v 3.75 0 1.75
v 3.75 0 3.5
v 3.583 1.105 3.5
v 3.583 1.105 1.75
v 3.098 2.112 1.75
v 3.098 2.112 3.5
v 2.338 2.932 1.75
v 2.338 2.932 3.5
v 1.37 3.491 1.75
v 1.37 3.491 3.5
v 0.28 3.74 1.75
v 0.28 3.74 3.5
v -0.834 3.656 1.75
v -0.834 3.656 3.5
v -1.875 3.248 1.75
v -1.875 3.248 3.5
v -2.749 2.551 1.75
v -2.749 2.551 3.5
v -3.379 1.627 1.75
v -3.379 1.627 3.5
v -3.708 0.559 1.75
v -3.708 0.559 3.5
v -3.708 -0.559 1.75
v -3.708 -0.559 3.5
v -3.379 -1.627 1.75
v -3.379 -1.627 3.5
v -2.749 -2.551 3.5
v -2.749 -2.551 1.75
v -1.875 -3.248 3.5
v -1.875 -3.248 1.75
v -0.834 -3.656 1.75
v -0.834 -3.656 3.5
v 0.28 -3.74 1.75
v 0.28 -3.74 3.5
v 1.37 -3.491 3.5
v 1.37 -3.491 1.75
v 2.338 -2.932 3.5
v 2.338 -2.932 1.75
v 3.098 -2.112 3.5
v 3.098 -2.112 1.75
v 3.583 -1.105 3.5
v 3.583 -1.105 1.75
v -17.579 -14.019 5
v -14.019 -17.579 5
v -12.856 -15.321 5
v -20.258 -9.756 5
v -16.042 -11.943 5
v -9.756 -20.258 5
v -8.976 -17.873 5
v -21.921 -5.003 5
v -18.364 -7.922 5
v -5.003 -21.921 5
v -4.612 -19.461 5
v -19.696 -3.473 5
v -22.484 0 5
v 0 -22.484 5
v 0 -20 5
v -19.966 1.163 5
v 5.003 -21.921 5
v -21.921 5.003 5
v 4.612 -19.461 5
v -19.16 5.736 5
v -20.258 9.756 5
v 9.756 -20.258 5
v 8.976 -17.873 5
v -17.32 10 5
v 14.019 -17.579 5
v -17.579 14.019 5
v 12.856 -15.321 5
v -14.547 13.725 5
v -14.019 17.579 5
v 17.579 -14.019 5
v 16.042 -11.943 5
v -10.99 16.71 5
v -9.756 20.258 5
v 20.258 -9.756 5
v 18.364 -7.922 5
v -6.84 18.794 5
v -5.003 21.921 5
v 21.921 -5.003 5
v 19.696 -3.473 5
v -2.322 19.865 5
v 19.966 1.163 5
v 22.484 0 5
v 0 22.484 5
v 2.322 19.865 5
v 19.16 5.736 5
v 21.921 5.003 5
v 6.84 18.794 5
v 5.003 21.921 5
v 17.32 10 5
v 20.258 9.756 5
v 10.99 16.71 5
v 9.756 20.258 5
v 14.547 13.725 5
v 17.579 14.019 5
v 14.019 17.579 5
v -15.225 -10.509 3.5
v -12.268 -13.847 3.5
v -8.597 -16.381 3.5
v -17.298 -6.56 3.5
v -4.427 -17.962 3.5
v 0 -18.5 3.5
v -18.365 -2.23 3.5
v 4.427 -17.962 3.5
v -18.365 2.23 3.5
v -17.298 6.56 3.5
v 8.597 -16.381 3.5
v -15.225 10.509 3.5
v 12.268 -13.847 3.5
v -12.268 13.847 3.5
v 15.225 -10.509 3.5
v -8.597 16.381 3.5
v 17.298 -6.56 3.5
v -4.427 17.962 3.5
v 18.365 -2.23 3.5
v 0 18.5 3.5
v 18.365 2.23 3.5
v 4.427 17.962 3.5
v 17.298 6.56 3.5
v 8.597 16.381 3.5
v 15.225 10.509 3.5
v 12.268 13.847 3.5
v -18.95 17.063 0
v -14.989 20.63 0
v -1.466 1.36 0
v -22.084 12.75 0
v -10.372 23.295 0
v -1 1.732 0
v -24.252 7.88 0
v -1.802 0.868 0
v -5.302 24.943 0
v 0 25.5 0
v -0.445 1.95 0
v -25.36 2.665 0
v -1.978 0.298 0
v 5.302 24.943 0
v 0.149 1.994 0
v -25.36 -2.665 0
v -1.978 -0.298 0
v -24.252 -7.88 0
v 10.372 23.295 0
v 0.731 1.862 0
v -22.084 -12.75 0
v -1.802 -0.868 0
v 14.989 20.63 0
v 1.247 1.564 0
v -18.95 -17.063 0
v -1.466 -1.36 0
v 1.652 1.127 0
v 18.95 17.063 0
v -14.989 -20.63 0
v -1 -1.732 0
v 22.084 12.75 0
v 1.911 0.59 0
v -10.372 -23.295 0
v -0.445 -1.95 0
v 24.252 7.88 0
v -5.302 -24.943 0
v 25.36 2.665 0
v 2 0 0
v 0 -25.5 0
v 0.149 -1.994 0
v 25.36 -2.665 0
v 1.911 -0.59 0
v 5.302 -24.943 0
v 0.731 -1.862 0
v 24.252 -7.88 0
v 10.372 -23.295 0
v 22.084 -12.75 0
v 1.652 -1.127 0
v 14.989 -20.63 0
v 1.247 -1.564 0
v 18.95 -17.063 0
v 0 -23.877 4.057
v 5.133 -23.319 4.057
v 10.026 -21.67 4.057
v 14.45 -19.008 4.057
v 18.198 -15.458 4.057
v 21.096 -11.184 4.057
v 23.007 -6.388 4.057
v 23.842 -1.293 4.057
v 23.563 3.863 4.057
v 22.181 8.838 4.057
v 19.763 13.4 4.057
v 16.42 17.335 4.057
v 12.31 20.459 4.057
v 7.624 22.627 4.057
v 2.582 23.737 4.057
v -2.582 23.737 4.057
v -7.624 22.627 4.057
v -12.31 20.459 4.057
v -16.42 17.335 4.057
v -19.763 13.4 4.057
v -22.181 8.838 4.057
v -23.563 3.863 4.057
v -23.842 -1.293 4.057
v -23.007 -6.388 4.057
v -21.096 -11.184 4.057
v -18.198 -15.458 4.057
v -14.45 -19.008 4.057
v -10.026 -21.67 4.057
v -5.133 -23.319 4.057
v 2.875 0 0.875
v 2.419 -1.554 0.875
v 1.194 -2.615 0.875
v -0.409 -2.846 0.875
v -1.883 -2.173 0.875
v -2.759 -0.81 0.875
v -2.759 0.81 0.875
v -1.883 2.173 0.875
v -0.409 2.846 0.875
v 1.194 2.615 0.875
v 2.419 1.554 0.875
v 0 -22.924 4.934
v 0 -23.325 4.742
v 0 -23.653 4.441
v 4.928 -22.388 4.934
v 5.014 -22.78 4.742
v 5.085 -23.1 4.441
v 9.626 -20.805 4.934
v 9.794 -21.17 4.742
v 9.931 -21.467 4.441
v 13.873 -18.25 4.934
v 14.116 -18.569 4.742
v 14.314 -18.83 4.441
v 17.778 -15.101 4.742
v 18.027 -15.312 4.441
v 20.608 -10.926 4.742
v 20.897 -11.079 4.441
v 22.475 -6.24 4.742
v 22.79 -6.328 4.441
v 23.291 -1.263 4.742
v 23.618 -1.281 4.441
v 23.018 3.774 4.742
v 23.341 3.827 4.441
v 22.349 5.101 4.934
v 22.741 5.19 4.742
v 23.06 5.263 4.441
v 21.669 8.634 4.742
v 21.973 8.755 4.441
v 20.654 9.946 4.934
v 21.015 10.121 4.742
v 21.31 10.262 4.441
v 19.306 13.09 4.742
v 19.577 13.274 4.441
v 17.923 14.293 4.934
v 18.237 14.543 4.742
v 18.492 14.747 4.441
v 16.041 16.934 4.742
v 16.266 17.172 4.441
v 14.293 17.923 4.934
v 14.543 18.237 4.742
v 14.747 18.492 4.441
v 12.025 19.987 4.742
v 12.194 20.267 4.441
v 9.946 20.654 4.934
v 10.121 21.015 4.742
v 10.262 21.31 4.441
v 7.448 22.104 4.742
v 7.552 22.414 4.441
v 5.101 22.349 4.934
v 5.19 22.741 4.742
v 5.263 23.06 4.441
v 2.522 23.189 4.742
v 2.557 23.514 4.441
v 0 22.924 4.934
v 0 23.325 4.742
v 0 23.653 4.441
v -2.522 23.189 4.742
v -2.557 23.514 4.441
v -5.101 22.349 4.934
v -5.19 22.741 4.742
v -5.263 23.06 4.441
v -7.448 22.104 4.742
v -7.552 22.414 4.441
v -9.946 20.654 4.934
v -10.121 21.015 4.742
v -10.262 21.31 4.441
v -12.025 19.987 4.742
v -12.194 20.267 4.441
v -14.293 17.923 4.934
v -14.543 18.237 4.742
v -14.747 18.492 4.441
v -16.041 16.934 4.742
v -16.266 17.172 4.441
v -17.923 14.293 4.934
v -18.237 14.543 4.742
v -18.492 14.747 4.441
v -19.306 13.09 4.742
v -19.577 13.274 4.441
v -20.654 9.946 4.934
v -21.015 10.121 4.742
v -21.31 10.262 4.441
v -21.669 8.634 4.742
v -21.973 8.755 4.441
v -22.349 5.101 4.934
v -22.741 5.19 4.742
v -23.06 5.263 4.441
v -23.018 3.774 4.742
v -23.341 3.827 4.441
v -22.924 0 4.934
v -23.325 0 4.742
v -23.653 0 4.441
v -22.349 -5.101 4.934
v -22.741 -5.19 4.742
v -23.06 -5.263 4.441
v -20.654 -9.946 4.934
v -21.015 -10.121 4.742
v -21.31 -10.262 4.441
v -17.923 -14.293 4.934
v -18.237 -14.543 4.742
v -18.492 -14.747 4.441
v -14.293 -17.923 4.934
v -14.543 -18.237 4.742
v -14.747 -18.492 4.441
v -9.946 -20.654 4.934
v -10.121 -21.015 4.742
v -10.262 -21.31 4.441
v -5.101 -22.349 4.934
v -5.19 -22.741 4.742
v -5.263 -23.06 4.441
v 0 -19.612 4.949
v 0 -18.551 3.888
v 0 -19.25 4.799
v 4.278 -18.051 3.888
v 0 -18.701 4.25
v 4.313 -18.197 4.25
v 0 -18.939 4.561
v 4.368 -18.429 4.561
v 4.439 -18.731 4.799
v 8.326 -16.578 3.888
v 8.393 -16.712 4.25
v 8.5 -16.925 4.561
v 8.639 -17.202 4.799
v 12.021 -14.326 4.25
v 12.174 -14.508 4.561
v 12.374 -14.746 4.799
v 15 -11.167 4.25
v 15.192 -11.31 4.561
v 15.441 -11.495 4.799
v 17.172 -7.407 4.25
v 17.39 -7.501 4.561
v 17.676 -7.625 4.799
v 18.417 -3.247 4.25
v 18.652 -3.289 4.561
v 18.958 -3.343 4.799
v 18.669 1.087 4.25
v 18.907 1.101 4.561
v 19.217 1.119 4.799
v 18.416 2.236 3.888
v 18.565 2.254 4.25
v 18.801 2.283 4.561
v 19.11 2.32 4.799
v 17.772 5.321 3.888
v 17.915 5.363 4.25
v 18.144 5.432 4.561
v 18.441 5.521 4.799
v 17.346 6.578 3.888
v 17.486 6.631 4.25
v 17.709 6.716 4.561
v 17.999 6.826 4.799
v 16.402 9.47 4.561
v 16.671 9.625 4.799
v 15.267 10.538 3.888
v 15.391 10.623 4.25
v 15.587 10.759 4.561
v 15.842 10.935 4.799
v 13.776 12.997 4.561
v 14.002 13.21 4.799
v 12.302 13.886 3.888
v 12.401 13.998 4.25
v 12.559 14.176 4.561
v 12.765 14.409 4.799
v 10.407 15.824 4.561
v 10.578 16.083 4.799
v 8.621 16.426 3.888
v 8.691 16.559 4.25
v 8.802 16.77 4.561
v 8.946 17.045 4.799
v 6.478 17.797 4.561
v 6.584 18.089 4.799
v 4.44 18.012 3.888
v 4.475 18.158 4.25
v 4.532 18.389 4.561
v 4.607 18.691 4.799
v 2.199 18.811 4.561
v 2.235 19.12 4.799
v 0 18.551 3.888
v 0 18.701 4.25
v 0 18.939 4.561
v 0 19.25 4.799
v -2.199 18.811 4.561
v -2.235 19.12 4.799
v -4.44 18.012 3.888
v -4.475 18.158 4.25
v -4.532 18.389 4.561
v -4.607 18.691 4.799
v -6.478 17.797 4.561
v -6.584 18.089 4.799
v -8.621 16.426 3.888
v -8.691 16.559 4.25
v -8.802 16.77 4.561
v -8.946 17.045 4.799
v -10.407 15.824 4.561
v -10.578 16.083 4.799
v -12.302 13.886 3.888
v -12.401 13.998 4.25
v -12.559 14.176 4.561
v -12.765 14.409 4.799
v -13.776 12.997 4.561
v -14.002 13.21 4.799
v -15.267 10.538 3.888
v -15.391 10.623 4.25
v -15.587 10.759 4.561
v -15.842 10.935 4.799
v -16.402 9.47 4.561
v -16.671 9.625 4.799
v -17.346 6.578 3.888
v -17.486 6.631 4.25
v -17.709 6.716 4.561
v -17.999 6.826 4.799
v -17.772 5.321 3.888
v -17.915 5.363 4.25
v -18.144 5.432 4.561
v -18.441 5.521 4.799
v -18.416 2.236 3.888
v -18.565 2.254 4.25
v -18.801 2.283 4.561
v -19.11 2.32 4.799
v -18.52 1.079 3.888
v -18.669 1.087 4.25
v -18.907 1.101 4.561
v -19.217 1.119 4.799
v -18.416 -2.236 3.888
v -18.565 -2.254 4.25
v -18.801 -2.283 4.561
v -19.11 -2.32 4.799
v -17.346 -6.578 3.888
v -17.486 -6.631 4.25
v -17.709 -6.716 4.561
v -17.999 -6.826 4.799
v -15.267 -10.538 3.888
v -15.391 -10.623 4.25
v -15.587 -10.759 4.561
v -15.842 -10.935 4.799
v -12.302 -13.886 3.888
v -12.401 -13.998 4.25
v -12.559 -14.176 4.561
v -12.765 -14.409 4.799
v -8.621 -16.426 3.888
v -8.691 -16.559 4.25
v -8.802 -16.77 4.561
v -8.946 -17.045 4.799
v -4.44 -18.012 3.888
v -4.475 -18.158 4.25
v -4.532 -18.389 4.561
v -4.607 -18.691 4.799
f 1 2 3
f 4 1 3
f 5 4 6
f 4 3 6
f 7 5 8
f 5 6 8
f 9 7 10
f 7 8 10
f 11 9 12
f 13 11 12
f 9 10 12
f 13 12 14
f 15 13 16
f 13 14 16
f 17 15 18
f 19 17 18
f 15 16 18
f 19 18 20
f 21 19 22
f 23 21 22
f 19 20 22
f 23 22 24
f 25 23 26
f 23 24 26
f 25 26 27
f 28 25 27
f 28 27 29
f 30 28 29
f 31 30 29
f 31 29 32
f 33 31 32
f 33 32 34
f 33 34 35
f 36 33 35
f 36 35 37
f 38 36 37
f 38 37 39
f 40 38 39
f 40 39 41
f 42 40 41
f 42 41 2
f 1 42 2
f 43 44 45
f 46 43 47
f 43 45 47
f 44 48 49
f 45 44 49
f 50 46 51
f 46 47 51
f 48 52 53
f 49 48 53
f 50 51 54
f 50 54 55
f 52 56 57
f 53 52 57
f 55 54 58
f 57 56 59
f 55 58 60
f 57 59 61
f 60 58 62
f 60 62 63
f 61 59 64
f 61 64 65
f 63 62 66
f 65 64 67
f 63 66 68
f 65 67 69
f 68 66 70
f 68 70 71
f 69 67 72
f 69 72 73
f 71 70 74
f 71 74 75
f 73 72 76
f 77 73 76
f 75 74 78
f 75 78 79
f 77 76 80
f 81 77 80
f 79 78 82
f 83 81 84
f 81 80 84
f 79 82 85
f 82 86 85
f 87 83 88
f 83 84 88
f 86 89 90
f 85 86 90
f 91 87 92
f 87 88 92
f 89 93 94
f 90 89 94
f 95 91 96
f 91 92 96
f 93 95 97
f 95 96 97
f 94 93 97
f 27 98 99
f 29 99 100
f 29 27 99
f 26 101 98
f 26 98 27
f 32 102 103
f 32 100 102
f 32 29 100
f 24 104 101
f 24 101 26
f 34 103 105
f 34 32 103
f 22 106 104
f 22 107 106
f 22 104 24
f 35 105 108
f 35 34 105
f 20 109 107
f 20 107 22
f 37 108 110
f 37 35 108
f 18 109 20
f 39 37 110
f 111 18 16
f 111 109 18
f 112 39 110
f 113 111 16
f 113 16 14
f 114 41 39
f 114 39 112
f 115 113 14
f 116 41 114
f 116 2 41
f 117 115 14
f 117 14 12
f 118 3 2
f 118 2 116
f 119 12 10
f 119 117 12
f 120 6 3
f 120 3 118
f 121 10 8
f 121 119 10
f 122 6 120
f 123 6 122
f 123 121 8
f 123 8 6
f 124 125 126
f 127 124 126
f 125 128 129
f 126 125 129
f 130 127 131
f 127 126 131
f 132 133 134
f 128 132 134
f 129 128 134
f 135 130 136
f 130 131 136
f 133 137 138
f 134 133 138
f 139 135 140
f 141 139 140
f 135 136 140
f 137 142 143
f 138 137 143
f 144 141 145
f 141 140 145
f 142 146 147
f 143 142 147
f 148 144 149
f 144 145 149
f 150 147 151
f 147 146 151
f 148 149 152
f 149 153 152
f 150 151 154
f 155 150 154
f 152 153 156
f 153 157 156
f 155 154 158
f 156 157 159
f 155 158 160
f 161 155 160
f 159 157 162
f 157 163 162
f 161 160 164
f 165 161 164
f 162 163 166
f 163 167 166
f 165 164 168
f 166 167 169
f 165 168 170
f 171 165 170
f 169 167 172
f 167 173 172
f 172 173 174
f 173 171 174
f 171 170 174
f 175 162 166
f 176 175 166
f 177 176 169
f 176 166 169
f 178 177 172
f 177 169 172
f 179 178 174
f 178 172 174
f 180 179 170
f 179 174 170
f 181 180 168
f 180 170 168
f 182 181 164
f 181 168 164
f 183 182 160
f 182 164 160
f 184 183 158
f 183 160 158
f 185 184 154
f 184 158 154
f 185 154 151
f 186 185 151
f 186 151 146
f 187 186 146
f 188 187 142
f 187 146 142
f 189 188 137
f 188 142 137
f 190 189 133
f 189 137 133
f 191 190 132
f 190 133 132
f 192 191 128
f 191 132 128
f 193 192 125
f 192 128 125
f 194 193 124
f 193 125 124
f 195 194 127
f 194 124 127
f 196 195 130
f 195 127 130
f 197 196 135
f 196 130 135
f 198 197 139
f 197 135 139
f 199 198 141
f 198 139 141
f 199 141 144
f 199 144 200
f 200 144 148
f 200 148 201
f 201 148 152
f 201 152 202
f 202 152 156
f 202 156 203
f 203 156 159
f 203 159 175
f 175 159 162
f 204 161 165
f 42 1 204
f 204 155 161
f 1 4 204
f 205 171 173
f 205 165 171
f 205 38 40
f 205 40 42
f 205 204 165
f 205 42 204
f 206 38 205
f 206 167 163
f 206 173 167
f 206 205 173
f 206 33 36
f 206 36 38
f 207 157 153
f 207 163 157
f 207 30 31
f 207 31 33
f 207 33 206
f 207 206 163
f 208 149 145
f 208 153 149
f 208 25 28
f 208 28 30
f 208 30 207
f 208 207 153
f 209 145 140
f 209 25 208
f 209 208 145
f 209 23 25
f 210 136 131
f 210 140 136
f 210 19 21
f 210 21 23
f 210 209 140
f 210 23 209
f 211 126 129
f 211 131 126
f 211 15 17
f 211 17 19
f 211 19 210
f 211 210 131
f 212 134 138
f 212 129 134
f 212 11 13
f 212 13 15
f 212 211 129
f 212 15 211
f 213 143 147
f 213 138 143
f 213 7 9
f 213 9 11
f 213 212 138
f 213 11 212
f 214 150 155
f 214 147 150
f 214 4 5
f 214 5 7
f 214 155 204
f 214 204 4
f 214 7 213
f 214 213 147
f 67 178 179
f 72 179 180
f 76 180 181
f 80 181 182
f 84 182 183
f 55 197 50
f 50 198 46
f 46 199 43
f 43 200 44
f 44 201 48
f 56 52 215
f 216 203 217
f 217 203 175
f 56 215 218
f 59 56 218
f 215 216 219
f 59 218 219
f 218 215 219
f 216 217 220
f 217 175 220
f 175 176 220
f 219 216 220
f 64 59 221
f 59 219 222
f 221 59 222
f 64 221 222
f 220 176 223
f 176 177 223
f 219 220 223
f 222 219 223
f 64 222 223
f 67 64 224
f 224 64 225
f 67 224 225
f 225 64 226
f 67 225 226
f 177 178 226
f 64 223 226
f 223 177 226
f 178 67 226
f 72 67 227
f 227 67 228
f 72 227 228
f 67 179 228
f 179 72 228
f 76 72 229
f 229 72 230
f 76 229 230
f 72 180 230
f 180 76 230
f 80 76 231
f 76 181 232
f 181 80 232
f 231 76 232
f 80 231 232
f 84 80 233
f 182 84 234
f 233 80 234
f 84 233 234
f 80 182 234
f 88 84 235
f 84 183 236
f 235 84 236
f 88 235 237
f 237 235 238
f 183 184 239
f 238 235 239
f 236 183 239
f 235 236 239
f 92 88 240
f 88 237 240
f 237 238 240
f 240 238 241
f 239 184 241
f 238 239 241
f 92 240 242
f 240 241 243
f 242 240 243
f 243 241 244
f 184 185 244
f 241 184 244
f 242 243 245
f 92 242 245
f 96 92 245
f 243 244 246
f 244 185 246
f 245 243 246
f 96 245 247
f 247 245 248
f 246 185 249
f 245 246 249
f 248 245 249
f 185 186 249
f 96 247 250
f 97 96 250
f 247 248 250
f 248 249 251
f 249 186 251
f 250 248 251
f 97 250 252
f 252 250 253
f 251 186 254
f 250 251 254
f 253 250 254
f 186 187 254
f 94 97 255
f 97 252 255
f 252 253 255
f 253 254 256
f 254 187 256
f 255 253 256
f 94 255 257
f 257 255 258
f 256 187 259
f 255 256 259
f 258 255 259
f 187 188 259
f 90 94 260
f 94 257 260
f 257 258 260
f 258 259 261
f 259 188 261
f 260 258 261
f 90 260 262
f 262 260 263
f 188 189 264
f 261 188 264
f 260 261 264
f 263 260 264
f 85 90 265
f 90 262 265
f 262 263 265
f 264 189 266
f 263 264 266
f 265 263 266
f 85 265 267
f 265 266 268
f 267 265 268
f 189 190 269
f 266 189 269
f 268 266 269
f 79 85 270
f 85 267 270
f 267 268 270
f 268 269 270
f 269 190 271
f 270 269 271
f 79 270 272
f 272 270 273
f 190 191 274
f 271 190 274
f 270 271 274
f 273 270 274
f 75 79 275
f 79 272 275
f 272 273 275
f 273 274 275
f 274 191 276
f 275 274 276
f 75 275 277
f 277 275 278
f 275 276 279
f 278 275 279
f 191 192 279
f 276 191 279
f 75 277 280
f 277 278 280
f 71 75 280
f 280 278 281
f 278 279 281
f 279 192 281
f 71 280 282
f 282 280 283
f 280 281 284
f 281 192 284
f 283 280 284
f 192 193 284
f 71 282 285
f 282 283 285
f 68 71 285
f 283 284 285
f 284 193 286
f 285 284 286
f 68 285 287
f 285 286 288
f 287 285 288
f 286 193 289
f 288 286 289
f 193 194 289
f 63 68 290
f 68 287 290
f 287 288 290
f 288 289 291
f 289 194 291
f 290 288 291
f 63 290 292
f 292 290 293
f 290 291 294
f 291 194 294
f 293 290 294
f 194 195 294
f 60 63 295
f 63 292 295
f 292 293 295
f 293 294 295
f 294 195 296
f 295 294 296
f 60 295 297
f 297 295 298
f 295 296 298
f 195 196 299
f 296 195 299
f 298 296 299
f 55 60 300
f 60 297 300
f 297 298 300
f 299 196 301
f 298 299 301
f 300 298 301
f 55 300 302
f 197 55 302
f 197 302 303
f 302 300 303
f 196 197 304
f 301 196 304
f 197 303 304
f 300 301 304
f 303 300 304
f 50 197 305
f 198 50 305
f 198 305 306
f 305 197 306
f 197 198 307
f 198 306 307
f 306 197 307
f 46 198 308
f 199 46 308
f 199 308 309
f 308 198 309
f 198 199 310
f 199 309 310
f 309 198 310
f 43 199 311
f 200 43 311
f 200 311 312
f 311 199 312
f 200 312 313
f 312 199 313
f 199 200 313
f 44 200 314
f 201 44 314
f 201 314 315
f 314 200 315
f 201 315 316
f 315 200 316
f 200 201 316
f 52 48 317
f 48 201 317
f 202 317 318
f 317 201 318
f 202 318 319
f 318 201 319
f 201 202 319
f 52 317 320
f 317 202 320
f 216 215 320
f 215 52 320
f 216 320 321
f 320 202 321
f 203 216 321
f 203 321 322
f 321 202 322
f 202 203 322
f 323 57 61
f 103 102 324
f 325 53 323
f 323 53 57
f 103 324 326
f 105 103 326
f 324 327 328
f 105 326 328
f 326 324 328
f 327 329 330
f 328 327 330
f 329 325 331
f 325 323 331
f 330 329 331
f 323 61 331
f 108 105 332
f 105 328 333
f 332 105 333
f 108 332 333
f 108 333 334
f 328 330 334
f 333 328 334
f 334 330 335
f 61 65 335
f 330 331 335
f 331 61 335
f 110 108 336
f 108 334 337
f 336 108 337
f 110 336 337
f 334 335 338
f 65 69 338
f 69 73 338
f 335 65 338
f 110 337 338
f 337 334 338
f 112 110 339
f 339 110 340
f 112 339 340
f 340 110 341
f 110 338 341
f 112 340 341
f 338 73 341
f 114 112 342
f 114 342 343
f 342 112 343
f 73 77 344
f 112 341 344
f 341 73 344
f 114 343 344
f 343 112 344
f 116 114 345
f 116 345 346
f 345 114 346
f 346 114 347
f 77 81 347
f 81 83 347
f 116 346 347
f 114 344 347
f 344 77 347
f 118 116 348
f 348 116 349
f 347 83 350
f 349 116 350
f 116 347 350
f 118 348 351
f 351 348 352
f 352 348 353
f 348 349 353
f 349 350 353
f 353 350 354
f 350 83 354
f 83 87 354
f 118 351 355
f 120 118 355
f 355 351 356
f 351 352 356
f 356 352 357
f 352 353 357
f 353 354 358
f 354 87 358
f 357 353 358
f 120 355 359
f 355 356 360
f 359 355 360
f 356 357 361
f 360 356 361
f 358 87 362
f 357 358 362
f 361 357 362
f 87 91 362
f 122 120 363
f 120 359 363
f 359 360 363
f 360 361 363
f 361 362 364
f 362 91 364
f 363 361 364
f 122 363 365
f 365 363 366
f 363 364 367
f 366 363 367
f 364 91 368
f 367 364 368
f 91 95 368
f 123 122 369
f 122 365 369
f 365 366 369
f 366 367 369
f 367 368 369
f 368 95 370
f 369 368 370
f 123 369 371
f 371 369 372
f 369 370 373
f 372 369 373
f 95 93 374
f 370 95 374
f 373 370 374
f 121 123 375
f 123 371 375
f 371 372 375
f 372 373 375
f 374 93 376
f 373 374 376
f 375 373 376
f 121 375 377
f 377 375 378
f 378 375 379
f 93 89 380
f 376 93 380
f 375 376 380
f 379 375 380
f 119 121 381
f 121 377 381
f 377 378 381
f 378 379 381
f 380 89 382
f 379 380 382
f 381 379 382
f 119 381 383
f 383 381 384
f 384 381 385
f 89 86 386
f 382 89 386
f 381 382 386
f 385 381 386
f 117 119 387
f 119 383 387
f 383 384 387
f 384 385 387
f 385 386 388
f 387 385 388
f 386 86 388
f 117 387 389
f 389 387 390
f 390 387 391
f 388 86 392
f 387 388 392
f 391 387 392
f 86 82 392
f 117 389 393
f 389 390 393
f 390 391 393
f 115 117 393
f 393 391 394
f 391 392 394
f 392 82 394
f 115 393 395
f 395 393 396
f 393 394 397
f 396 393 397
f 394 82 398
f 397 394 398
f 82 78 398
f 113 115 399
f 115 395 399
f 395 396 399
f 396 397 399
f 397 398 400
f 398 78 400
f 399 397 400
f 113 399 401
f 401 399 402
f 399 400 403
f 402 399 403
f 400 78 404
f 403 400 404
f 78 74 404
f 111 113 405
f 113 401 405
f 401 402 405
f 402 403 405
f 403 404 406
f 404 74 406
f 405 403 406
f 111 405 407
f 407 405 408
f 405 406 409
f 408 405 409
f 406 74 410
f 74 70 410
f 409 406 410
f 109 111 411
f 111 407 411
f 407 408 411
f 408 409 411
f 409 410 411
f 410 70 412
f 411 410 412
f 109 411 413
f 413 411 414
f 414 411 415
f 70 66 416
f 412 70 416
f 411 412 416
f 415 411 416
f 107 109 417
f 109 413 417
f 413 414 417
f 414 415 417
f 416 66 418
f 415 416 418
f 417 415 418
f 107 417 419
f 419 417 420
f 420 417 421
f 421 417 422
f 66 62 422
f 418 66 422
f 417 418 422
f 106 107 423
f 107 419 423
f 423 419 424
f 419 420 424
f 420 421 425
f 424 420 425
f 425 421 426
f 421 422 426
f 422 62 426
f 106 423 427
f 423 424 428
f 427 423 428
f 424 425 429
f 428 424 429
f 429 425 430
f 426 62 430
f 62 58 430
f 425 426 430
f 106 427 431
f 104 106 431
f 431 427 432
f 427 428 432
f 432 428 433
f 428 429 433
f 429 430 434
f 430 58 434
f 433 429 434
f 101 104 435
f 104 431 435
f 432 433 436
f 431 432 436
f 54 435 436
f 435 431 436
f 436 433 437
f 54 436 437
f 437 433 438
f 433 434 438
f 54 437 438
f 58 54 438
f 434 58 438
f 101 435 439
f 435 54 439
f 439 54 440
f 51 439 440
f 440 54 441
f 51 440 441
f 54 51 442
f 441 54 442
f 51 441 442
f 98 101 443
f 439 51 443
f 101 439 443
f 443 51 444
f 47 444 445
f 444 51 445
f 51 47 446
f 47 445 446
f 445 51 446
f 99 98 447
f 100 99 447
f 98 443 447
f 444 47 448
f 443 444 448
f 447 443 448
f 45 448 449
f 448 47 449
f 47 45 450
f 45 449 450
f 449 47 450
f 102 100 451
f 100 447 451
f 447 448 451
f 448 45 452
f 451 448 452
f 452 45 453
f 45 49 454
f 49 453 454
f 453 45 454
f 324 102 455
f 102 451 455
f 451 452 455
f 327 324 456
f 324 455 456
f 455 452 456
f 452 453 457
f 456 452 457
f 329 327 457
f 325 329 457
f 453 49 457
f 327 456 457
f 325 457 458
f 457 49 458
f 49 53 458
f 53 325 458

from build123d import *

# Parameters (mm, degrees)
F0_R        = 18.5
F0_R_2      = 2
F1_DEPTH    = 3.5
F2_R        = 3.75
F3_DEPTH    = 0.5
F4_S5_R     = 3.75
F4_T6_DEPTH = 9
F8_R        = 1.49999


# Not quite as in the source:
# - a fillet or chamfer that OpenCascade refuses, or shapes differently, is made with other operations: its cross-section is extruded or revolved along the edge and cut away or added
# - a fillet or chamfer is up to 0.001 mm smaller than in the source, because OpenCascade refuses the exact size


with BuildPart() as f1:
    # F0 (on Top) → F1 (new body)
    with BuildSketch(Plane.XY):
        Circle(F0_R)
        Circle(F0_R_2, mode=Mode.SUBTRACT)
    extrude(amount=F1_DEPTH)

    # F2 (on face) → F3 (cut)
    with BuildSketch(Plane.XY.offset(3.5)):
        Circle(F2_R)
    extrude(amount=-F3_DEPTH, mode=Mode.SUBTRACT)

    # F4: chamfer of 3 on 1 edges, made by hand


with BuildPart() as f4_tool2:
    # F4_s3 → F4_t4 (revolve)
    with BuildSketch(Plane.XZ):
        Polygon((2, 0), (5, 3), (2, 3), align=None)
    revolve(axis=Axis((0, 0, 3), (0, 0, -1)))

    # F4_s5 → F4_t6 (intersect, symmetric)
    with BuildSketch(Plane.XY.offset(1.5)):
        Circle(F4_S5_R)
    extrude(amount=F4_T6_DEPTH, both=True, mode=Mode.INTERSECT)


with BuildPart() as f1_1:
    add(f1.part)

    # F4_t1: cut F4_tool2
    add(f4_tool2.part, mode=Mode.SUBTRACT)

    # F6 (on Right) → F7 (revolve)
    with BuildSketch(Plane.YZ):
        Polygon((-25.5, 0), (-18.5, 0), (-18.5, 3.5), (-18.5, 5), (-23.5, 5), align=None)
    revolve(axis=Axis((0, 0, 7.0907436311), (0, 0, 1)))

    # F8 (radius 1.5 in the source; OpenCascade refuses exactly that, so slightly less here)
    f8_edges = [f1_1.edges().sort_by_distance(p)[0] for p in [
        (0, 23.5, 5),
        (0, 18.5, 5),
    ]]
    fillet(f8_edges, radius=F8_R)


solid = f1_1.part
